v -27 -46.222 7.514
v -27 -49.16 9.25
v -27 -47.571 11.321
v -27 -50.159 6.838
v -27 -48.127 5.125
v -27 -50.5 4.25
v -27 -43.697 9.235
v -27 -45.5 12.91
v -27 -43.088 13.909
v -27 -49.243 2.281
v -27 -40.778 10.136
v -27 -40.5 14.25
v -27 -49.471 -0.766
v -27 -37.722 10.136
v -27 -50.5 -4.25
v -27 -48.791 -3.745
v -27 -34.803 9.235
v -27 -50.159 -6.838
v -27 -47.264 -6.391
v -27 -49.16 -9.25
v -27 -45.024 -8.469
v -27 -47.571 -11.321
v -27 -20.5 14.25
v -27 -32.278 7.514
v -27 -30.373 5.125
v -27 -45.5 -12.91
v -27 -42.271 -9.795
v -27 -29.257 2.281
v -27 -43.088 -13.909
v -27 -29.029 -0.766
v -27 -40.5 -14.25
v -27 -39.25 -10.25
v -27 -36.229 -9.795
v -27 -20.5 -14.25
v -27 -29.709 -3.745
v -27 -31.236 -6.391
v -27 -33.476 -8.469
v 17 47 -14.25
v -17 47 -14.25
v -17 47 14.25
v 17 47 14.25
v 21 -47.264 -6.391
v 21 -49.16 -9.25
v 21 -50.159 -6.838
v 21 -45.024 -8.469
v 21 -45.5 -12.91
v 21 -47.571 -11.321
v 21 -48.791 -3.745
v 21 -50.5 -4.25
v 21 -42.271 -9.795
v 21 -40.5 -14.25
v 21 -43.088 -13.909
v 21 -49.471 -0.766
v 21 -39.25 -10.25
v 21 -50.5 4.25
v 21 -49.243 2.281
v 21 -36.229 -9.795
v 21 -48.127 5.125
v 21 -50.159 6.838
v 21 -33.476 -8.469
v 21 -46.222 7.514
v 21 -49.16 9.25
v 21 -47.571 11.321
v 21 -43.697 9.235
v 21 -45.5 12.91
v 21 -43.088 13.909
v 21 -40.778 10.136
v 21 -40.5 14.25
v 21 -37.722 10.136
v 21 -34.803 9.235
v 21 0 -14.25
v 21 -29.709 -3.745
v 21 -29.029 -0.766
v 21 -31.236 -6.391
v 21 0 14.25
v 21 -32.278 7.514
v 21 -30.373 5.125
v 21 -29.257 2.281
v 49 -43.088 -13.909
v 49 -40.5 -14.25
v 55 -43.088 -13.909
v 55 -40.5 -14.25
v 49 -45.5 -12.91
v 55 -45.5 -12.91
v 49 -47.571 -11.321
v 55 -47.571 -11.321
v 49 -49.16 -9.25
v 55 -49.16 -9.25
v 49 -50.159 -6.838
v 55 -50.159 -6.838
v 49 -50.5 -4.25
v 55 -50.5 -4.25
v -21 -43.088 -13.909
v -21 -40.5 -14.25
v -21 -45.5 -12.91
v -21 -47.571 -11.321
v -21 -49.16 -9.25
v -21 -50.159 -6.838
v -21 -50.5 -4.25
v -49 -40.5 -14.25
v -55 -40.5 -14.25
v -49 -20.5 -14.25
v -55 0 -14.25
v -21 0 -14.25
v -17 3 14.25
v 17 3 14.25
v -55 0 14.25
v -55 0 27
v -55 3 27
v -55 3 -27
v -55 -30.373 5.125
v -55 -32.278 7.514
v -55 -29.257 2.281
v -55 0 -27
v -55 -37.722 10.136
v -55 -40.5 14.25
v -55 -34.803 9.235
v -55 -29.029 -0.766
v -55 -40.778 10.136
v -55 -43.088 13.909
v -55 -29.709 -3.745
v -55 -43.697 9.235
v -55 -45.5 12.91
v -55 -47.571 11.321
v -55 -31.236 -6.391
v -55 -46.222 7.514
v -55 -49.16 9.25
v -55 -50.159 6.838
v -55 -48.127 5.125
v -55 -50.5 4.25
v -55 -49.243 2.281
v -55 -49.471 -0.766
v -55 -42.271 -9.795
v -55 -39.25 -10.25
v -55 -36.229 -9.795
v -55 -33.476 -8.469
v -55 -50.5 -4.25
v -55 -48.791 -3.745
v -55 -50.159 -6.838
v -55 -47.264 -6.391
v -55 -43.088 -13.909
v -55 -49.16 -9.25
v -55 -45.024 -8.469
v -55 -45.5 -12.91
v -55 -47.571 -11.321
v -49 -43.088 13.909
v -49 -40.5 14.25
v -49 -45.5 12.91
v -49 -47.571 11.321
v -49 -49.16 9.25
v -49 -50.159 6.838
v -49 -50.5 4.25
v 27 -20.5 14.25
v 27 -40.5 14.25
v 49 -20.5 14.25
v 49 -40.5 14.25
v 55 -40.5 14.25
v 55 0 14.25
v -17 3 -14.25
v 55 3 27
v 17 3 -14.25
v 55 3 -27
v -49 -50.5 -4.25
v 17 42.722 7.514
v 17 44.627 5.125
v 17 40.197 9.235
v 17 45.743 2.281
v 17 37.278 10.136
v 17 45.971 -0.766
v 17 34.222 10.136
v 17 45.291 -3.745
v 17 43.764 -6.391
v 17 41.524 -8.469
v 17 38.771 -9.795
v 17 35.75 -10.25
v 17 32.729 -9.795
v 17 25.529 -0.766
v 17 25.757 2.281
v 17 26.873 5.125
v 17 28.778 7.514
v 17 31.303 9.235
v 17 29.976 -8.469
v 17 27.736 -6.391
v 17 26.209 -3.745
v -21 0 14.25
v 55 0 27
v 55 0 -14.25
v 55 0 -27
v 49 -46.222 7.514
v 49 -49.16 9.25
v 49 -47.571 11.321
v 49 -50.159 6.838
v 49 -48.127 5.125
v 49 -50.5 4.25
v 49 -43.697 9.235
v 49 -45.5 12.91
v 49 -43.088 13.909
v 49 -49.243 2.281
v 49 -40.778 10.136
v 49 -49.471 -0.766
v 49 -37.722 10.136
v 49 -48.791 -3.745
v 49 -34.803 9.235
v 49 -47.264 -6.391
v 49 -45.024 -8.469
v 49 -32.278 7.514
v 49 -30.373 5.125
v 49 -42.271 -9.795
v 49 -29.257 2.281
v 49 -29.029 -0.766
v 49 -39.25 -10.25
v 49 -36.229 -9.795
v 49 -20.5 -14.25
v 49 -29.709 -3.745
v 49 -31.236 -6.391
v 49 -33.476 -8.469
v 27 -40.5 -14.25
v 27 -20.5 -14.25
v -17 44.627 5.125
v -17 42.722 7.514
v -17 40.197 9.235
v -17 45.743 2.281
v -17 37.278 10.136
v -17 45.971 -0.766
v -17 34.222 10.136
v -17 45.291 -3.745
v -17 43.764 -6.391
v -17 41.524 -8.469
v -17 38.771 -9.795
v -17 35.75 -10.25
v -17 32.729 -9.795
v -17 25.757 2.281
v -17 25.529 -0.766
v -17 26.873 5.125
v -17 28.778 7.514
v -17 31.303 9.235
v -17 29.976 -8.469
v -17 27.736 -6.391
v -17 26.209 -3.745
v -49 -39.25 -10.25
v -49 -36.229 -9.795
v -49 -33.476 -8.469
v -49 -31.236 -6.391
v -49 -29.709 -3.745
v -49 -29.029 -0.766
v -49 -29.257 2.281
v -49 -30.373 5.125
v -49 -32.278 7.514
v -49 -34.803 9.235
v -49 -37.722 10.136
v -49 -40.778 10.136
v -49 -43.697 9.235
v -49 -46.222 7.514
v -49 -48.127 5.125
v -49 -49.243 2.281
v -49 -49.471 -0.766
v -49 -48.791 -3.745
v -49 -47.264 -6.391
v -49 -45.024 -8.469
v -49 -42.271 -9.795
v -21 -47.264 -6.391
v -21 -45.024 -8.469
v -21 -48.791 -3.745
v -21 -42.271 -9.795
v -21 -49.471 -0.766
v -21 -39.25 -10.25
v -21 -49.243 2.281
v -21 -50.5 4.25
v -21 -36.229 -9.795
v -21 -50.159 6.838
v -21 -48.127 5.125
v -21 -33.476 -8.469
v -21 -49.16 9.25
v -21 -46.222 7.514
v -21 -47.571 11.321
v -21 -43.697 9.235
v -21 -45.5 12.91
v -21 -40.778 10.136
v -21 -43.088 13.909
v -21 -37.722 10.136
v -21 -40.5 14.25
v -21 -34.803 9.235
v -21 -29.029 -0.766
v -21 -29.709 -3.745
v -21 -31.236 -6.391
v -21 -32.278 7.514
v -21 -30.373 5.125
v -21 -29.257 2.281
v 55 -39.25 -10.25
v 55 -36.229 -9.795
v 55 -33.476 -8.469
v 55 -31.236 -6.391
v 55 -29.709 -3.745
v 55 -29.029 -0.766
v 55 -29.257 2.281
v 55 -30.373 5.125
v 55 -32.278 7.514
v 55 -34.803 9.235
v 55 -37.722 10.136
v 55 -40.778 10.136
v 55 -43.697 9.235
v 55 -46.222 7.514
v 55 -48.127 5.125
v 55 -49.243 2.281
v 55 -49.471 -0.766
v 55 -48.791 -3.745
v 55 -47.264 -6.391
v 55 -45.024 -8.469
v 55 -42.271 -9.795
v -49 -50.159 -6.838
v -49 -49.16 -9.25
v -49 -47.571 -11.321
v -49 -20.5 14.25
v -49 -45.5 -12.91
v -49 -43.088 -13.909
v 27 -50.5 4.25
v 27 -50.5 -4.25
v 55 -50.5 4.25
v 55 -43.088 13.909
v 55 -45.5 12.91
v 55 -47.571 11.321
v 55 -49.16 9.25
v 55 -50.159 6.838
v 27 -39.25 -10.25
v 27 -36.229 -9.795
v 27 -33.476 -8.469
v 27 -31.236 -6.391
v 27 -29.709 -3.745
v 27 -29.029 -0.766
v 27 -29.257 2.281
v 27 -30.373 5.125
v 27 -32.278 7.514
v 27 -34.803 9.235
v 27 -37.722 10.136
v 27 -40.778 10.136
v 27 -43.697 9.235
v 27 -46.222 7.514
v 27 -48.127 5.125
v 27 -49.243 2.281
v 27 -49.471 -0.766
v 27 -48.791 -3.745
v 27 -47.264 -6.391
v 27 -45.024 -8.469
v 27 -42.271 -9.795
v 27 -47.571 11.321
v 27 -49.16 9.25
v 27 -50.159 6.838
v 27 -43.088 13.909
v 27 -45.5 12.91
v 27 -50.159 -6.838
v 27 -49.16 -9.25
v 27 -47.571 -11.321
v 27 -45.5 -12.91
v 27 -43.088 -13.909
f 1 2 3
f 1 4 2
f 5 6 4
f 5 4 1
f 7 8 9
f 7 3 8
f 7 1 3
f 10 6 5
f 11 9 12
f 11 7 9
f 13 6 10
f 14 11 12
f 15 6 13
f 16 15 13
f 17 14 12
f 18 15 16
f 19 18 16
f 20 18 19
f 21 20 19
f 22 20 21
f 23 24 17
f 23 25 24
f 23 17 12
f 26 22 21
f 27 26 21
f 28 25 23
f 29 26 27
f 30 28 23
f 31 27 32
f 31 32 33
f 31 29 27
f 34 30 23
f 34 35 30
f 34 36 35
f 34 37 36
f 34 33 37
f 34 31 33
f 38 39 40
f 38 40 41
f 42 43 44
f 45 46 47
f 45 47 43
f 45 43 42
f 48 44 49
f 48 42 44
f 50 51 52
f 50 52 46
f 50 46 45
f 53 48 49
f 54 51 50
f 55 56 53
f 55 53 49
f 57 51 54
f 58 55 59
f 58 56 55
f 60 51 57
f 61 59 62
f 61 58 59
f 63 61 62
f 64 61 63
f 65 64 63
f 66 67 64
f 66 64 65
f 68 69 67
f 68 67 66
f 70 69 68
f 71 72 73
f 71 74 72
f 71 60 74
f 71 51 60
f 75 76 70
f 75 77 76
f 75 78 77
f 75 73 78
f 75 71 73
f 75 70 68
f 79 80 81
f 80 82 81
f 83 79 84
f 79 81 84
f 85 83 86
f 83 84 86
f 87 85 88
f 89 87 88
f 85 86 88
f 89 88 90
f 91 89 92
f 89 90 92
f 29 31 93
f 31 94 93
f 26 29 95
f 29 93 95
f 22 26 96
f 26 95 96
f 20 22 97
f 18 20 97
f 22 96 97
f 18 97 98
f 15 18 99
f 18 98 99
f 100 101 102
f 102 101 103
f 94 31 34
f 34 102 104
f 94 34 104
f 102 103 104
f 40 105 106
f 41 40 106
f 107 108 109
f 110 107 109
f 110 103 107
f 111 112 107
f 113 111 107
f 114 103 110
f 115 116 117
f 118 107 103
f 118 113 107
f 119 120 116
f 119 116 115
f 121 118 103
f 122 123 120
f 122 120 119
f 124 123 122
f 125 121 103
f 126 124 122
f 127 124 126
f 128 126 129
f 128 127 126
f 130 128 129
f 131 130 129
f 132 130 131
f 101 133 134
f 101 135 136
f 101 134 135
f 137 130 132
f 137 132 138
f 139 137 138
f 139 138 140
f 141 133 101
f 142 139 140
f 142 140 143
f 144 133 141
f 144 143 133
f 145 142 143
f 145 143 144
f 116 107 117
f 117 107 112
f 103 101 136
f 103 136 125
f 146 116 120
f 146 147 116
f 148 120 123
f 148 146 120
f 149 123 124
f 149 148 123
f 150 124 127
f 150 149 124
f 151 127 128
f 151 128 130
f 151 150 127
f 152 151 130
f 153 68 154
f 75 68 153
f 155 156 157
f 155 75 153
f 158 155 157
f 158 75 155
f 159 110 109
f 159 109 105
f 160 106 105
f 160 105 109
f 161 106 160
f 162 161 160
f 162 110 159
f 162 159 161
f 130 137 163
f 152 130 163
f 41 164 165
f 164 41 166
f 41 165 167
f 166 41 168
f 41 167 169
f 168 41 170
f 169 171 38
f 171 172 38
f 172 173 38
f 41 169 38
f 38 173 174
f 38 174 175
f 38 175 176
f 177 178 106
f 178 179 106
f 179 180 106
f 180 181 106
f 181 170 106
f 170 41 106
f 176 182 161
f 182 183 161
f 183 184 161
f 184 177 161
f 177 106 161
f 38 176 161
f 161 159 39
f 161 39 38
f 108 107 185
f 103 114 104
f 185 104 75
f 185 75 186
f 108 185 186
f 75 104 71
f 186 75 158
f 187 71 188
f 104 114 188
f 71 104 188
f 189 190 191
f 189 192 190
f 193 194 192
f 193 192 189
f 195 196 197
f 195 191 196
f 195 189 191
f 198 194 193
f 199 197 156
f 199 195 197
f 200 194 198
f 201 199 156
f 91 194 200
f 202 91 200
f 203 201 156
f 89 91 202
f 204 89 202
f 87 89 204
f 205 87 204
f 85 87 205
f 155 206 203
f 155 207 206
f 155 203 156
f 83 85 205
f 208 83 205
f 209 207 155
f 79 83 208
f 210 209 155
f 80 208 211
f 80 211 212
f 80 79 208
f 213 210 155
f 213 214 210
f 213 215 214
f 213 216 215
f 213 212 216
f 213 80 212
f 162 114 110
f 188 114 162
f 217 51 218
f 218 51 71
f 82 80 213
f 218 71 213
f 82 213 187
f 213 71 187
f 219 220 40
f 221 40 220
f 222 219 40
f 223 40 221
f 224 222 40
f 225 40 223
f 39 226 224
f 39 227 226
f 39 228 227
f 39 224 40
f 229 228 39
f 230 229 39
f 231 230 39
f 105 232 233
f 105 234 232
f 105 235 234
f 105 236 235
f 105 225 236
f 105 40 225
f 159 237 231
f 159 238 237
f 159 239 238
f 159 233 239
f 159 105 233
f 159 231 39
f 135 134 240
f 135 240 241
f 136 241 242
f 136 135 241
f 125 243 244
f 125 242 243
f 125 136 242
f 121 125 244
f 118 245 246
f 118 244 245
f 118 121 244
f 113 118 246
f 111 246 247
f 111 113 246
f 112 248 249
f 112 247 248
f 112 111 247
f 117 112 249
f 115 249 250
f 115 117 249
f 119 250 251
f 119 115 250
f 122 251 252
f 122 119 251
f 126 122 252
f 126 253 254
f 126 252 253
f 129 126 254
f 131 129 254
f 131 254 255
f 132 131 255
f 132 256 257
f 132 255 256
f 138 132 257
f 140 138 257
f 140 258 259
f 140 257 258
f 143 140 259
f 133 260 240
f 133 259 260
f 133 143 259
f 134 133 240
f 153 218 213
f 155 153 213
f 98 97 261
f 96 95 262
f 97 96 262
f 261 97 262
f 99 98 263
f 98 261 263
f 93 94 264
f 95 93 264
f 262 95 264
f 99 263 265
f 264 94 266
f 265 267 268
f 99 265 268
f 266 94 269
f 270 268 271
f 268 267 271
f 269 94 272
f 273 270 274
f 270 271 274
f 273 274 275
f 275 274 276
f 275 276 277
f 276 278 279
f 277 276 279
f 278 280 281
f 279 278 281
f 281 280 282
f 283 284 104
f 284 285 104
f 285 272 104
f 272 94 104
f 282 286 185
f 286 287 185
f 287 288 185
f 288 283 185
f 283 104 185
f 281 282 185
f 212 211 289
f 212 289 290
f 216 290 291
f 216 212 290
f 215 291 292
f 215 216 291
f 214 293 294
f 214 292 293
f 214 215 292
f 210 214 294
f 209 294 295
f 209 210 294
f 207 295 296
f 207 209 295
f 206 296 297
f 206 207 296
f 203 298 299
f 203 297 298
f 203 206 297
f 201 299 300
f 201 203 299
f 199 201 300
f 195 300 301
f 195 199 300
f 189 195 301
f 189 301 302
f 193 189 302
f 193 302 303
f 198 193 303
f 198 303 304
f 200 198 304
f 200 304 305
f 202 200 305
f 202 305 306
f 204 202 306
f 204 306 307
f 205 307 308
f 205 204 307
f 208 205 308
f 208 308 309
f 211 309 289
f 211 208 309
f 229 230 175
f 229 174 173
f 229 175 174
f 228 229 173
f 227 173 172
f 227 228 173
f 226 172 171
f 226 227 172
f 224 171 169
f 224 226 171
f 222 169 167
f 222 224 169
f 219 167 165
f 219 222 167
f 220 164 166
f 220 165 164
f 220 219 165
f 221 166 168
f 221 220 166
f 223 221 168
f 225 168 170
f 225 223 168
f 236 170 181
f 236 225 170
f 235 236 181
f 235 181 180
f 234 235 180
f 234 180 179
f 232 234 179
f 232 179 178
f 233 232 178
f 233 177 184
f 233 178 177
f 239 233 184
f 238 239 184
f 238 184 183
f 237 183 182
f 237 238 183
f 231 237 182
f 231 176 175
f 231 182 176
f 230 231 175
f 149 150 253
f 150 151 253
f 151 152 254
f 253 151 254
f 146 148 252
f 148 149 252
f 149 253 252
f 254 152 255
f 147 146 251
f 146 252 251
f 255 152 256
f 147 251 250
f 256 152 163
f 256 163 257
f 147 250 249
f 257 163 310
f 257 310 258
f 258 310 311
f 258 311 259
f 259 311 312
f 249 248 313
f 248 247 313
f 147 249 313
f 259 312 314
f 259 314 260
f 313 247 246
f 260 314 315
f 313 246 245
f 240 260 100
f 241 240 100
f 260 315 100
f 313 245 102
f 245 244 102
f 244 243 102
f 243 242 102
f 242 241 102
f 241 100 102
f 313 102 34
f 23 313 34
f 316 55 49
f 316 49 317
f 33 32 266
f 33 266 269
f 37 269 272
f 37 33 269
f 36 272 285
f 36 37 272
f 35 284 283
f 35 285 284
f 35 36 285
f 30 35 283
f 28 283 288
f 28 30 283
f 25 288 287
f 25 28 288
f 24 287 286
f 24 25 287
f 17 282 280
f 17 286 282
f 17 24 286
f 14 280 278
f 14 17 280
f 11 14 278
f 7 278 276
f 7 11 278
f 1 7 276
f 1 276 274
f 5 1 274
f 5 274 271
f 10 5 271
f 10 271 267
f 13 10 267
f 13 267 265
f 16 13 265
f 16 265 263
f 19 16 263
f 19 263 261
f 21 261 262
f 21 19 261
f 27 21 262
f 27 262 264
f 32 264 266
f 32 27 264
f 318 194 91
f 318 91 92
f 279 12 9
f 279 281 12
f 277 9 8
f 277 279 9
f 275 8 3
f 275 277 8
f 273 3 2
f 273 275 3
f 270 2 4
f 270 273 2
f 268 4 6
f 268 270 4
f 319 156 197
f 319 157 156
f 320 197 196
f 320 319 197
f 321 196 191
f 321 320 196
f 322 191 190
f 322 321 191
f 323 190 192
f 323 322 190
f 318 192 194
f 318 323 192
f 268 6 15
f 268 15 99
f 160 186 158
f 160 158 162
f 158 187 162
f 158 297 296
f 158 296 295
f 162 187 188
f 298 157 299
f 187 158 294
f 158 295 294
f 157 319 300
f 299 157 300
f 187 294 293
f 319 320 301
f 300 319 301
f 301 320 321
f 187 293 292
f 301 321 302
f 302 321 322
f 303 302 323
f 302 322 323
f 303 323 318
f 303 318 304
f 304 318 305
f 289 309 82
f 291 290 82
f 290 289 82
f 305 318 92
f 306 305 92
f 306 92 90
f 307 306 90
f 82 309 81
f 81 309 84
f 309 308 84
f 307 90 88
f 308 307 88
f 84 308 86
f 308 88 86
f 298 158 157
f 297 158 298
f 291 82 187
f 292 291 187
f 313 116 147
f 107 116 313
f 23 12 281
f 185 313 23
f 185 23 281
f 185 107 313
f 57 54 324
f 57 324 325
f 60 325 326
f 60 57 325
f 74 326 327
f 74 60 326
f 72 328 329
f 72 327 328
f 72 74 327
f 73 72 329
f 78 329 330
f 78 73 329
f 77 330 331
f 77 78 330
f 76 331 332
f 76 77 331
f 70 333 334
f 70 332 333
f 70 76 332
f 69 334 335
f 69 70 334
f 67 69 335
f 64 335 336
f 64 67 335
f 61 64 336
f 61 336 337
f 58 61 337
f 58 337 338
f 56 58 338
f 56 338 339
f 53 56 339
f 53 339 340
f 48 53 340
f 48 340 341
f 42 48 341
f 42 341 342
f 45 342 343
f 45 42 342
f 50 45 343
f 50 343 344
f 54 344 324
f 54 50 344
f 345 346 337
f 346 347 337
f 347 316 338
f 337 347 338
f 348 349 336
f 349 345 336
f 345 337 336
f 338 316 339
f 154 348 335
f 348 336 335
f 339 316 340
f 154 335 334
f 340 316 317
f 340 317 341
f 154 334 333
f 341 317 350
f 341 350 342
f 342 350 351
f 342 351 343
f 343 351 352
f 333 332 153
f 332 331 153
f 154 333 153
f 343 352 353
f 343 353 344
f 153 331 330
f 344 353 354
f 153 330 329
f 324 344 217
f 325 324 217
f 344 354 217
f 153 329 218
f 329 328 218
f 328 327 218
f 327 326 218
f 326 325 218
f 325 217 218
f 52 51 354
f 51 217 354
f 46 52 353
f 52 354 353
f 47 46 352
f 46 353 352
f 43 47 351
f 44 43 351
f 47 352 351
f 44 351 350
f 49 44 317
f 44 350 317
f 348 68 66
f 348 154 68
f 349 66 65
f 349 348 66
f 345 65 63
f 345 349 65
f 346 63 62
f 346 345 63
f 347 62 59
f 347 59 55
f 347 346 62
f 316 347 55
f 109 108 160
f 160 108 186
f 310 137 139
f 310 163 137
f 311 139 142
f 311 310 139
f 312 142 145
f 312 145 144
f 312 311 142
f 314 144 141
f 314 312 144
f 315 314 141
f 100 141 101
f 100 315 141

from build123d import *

# Parameters (mm, degrees)
SKETCH1_W               = 110
SKETCH1_H               = 54
BOSS_EXTRUDE1_DEPTH     = 3
SKETCH2_W               = 34
SKETCH2_H               = 28.5
BOSS_EXTRUDE2_DEPTH     = 50.5
CUT_EXTRUDE1_DEPTH      = 125.013104146
CUT_EXTRUDE1_DEPTH_BACK = 125.013104146
SKETCH3_R               = 10.25
CUT_EXTRUDE2_DEPTH      = 86.304234948
CUT_EXTRUDE2_DEPTH_BACK = 86.304234948
SKETCH4_W               = 22
SKETCH4_H               = 30
FILLET1_R               = 10
SKETCH5_W               = 34
SKETCH5_H               = 28.5
BOSS_EXTRUDE3_DEPTH     = 44
CUT_EXTRUDE3_DEPTH      = 92.995923823
CUT_EXTRUDE3_DEPTH_BACK = 92.995923823
SKETCH6_R               = 10.25


with BuildPart() as part:
    # Sketch1 → Boss-Extrude1 (new body)
    with BuildSketch(Plane(origin=(0, 0, 0), x_dir=(1, 0, 0), z_dir=(0, 1, 0))):
        Rectangle(SKETCH1_W, SKETCH1_H)
    extrude(amount=BOSS_EXTRUDE1_DEPTH)

    # Sketch2 → Boss-Extrude2 (add)
    with BuildSketch(Plane.XZ):
        with Locations((38, 0)):
            Rectangle(SKETCH2_W, SKETCH2_H)
        with Locations((-38, 0)):
            Rectangle(SKETCH2_W, SKETCH2_H)
    extrude(amount=BOSS_EXTRUDE2_DEPTH)

    # Sketch3 → Cut-Extrude1 (cut, two sides: drawn at the far end of the back side and taken through both)
    with BuildSketch(Plane(origin=(55, 0, 0), x_dir=(0, 0, -1), z_dir=(1, 0, 0)).offset(-CUT_EXTRUDE1_DEPTH_BACK)):
        with Locations((0, -39.25)):
            Circle(SKETCH3_R)
    extrude(amount=CUT_EXTRUDE1_DEPTH + CUT_EXTRUDE1_DEPTH_BACK, mode=Mode.SUBTRACT)

    # Sketch4 → Cut-Extrude2 (cut, two sides: drawn at the far end of the back side and taken through both)
    with BuildSketch(Plane.XY.offset(14.25).offset(-CUT_EXTRUDE2_DEPTH_BACK)):
        with Locations((38, -35.5)):
            Rectangle(SKETCH4_W, SKETCH4_H)
        with Locations((-38, -35.5)):
            Rectangle(SKETCH4_W, SKETCH4_H)
    extrude(amount=CUT_EXTRUDE2_DEPTH + CUT_EXTRUDE2_DEPTH_BACK, mode=Mode.SUBTRACT)

    # Fillet1
    fillet1_edges = [part.edges().sort_by_distance(p)[0] for p in [
        (52, -50.5, 14.25),
        (24, -50.5, -14.25),
        (-24, -50.5, 14.25),
        (-52, -50.5, -14.25),
        (-52, -50.5, 14.25),
        (-24, -50.5, -14.25),
        (24, -50.5, 14.25),
        (52, -50.5, -14.25),
    ]]
    fillet(fillet1_edges, radius=FILLET1_R)

    # Sketch5 → Boss-Extrude3 (add)
    with BuildSketch(Plane(origin=(0, 3, 0), x_dir=(1, 0, 0), z_dir=(0, 1, 0))):
        Rectangle(SKETCH5_W, SKETCH5_H)
    extrude(amount=BOSS_EXTRUDE3_DEPTH)

    # Sketch6 → Cut-Extrude3 (cut, two sides: drawn at the far end of the back side and taken through both)
    with BuildSketch(Plane(origin=(17, 0, 0), x_dir=(0, 0, -1), z_dir=(1, 0, 0)).offset(-CUT_EXTRUDE3_DEPTH_BACK)):
        with Locations((0, 35.75)):
            Circle(SKETCH6_R)
    extrude(amount=CUT_EXTRUDE3_DEPTH + CUT_EXTRUDE3_DEPTH_BACK, mode=Mode.SUBTRACT)


solid = part.part
